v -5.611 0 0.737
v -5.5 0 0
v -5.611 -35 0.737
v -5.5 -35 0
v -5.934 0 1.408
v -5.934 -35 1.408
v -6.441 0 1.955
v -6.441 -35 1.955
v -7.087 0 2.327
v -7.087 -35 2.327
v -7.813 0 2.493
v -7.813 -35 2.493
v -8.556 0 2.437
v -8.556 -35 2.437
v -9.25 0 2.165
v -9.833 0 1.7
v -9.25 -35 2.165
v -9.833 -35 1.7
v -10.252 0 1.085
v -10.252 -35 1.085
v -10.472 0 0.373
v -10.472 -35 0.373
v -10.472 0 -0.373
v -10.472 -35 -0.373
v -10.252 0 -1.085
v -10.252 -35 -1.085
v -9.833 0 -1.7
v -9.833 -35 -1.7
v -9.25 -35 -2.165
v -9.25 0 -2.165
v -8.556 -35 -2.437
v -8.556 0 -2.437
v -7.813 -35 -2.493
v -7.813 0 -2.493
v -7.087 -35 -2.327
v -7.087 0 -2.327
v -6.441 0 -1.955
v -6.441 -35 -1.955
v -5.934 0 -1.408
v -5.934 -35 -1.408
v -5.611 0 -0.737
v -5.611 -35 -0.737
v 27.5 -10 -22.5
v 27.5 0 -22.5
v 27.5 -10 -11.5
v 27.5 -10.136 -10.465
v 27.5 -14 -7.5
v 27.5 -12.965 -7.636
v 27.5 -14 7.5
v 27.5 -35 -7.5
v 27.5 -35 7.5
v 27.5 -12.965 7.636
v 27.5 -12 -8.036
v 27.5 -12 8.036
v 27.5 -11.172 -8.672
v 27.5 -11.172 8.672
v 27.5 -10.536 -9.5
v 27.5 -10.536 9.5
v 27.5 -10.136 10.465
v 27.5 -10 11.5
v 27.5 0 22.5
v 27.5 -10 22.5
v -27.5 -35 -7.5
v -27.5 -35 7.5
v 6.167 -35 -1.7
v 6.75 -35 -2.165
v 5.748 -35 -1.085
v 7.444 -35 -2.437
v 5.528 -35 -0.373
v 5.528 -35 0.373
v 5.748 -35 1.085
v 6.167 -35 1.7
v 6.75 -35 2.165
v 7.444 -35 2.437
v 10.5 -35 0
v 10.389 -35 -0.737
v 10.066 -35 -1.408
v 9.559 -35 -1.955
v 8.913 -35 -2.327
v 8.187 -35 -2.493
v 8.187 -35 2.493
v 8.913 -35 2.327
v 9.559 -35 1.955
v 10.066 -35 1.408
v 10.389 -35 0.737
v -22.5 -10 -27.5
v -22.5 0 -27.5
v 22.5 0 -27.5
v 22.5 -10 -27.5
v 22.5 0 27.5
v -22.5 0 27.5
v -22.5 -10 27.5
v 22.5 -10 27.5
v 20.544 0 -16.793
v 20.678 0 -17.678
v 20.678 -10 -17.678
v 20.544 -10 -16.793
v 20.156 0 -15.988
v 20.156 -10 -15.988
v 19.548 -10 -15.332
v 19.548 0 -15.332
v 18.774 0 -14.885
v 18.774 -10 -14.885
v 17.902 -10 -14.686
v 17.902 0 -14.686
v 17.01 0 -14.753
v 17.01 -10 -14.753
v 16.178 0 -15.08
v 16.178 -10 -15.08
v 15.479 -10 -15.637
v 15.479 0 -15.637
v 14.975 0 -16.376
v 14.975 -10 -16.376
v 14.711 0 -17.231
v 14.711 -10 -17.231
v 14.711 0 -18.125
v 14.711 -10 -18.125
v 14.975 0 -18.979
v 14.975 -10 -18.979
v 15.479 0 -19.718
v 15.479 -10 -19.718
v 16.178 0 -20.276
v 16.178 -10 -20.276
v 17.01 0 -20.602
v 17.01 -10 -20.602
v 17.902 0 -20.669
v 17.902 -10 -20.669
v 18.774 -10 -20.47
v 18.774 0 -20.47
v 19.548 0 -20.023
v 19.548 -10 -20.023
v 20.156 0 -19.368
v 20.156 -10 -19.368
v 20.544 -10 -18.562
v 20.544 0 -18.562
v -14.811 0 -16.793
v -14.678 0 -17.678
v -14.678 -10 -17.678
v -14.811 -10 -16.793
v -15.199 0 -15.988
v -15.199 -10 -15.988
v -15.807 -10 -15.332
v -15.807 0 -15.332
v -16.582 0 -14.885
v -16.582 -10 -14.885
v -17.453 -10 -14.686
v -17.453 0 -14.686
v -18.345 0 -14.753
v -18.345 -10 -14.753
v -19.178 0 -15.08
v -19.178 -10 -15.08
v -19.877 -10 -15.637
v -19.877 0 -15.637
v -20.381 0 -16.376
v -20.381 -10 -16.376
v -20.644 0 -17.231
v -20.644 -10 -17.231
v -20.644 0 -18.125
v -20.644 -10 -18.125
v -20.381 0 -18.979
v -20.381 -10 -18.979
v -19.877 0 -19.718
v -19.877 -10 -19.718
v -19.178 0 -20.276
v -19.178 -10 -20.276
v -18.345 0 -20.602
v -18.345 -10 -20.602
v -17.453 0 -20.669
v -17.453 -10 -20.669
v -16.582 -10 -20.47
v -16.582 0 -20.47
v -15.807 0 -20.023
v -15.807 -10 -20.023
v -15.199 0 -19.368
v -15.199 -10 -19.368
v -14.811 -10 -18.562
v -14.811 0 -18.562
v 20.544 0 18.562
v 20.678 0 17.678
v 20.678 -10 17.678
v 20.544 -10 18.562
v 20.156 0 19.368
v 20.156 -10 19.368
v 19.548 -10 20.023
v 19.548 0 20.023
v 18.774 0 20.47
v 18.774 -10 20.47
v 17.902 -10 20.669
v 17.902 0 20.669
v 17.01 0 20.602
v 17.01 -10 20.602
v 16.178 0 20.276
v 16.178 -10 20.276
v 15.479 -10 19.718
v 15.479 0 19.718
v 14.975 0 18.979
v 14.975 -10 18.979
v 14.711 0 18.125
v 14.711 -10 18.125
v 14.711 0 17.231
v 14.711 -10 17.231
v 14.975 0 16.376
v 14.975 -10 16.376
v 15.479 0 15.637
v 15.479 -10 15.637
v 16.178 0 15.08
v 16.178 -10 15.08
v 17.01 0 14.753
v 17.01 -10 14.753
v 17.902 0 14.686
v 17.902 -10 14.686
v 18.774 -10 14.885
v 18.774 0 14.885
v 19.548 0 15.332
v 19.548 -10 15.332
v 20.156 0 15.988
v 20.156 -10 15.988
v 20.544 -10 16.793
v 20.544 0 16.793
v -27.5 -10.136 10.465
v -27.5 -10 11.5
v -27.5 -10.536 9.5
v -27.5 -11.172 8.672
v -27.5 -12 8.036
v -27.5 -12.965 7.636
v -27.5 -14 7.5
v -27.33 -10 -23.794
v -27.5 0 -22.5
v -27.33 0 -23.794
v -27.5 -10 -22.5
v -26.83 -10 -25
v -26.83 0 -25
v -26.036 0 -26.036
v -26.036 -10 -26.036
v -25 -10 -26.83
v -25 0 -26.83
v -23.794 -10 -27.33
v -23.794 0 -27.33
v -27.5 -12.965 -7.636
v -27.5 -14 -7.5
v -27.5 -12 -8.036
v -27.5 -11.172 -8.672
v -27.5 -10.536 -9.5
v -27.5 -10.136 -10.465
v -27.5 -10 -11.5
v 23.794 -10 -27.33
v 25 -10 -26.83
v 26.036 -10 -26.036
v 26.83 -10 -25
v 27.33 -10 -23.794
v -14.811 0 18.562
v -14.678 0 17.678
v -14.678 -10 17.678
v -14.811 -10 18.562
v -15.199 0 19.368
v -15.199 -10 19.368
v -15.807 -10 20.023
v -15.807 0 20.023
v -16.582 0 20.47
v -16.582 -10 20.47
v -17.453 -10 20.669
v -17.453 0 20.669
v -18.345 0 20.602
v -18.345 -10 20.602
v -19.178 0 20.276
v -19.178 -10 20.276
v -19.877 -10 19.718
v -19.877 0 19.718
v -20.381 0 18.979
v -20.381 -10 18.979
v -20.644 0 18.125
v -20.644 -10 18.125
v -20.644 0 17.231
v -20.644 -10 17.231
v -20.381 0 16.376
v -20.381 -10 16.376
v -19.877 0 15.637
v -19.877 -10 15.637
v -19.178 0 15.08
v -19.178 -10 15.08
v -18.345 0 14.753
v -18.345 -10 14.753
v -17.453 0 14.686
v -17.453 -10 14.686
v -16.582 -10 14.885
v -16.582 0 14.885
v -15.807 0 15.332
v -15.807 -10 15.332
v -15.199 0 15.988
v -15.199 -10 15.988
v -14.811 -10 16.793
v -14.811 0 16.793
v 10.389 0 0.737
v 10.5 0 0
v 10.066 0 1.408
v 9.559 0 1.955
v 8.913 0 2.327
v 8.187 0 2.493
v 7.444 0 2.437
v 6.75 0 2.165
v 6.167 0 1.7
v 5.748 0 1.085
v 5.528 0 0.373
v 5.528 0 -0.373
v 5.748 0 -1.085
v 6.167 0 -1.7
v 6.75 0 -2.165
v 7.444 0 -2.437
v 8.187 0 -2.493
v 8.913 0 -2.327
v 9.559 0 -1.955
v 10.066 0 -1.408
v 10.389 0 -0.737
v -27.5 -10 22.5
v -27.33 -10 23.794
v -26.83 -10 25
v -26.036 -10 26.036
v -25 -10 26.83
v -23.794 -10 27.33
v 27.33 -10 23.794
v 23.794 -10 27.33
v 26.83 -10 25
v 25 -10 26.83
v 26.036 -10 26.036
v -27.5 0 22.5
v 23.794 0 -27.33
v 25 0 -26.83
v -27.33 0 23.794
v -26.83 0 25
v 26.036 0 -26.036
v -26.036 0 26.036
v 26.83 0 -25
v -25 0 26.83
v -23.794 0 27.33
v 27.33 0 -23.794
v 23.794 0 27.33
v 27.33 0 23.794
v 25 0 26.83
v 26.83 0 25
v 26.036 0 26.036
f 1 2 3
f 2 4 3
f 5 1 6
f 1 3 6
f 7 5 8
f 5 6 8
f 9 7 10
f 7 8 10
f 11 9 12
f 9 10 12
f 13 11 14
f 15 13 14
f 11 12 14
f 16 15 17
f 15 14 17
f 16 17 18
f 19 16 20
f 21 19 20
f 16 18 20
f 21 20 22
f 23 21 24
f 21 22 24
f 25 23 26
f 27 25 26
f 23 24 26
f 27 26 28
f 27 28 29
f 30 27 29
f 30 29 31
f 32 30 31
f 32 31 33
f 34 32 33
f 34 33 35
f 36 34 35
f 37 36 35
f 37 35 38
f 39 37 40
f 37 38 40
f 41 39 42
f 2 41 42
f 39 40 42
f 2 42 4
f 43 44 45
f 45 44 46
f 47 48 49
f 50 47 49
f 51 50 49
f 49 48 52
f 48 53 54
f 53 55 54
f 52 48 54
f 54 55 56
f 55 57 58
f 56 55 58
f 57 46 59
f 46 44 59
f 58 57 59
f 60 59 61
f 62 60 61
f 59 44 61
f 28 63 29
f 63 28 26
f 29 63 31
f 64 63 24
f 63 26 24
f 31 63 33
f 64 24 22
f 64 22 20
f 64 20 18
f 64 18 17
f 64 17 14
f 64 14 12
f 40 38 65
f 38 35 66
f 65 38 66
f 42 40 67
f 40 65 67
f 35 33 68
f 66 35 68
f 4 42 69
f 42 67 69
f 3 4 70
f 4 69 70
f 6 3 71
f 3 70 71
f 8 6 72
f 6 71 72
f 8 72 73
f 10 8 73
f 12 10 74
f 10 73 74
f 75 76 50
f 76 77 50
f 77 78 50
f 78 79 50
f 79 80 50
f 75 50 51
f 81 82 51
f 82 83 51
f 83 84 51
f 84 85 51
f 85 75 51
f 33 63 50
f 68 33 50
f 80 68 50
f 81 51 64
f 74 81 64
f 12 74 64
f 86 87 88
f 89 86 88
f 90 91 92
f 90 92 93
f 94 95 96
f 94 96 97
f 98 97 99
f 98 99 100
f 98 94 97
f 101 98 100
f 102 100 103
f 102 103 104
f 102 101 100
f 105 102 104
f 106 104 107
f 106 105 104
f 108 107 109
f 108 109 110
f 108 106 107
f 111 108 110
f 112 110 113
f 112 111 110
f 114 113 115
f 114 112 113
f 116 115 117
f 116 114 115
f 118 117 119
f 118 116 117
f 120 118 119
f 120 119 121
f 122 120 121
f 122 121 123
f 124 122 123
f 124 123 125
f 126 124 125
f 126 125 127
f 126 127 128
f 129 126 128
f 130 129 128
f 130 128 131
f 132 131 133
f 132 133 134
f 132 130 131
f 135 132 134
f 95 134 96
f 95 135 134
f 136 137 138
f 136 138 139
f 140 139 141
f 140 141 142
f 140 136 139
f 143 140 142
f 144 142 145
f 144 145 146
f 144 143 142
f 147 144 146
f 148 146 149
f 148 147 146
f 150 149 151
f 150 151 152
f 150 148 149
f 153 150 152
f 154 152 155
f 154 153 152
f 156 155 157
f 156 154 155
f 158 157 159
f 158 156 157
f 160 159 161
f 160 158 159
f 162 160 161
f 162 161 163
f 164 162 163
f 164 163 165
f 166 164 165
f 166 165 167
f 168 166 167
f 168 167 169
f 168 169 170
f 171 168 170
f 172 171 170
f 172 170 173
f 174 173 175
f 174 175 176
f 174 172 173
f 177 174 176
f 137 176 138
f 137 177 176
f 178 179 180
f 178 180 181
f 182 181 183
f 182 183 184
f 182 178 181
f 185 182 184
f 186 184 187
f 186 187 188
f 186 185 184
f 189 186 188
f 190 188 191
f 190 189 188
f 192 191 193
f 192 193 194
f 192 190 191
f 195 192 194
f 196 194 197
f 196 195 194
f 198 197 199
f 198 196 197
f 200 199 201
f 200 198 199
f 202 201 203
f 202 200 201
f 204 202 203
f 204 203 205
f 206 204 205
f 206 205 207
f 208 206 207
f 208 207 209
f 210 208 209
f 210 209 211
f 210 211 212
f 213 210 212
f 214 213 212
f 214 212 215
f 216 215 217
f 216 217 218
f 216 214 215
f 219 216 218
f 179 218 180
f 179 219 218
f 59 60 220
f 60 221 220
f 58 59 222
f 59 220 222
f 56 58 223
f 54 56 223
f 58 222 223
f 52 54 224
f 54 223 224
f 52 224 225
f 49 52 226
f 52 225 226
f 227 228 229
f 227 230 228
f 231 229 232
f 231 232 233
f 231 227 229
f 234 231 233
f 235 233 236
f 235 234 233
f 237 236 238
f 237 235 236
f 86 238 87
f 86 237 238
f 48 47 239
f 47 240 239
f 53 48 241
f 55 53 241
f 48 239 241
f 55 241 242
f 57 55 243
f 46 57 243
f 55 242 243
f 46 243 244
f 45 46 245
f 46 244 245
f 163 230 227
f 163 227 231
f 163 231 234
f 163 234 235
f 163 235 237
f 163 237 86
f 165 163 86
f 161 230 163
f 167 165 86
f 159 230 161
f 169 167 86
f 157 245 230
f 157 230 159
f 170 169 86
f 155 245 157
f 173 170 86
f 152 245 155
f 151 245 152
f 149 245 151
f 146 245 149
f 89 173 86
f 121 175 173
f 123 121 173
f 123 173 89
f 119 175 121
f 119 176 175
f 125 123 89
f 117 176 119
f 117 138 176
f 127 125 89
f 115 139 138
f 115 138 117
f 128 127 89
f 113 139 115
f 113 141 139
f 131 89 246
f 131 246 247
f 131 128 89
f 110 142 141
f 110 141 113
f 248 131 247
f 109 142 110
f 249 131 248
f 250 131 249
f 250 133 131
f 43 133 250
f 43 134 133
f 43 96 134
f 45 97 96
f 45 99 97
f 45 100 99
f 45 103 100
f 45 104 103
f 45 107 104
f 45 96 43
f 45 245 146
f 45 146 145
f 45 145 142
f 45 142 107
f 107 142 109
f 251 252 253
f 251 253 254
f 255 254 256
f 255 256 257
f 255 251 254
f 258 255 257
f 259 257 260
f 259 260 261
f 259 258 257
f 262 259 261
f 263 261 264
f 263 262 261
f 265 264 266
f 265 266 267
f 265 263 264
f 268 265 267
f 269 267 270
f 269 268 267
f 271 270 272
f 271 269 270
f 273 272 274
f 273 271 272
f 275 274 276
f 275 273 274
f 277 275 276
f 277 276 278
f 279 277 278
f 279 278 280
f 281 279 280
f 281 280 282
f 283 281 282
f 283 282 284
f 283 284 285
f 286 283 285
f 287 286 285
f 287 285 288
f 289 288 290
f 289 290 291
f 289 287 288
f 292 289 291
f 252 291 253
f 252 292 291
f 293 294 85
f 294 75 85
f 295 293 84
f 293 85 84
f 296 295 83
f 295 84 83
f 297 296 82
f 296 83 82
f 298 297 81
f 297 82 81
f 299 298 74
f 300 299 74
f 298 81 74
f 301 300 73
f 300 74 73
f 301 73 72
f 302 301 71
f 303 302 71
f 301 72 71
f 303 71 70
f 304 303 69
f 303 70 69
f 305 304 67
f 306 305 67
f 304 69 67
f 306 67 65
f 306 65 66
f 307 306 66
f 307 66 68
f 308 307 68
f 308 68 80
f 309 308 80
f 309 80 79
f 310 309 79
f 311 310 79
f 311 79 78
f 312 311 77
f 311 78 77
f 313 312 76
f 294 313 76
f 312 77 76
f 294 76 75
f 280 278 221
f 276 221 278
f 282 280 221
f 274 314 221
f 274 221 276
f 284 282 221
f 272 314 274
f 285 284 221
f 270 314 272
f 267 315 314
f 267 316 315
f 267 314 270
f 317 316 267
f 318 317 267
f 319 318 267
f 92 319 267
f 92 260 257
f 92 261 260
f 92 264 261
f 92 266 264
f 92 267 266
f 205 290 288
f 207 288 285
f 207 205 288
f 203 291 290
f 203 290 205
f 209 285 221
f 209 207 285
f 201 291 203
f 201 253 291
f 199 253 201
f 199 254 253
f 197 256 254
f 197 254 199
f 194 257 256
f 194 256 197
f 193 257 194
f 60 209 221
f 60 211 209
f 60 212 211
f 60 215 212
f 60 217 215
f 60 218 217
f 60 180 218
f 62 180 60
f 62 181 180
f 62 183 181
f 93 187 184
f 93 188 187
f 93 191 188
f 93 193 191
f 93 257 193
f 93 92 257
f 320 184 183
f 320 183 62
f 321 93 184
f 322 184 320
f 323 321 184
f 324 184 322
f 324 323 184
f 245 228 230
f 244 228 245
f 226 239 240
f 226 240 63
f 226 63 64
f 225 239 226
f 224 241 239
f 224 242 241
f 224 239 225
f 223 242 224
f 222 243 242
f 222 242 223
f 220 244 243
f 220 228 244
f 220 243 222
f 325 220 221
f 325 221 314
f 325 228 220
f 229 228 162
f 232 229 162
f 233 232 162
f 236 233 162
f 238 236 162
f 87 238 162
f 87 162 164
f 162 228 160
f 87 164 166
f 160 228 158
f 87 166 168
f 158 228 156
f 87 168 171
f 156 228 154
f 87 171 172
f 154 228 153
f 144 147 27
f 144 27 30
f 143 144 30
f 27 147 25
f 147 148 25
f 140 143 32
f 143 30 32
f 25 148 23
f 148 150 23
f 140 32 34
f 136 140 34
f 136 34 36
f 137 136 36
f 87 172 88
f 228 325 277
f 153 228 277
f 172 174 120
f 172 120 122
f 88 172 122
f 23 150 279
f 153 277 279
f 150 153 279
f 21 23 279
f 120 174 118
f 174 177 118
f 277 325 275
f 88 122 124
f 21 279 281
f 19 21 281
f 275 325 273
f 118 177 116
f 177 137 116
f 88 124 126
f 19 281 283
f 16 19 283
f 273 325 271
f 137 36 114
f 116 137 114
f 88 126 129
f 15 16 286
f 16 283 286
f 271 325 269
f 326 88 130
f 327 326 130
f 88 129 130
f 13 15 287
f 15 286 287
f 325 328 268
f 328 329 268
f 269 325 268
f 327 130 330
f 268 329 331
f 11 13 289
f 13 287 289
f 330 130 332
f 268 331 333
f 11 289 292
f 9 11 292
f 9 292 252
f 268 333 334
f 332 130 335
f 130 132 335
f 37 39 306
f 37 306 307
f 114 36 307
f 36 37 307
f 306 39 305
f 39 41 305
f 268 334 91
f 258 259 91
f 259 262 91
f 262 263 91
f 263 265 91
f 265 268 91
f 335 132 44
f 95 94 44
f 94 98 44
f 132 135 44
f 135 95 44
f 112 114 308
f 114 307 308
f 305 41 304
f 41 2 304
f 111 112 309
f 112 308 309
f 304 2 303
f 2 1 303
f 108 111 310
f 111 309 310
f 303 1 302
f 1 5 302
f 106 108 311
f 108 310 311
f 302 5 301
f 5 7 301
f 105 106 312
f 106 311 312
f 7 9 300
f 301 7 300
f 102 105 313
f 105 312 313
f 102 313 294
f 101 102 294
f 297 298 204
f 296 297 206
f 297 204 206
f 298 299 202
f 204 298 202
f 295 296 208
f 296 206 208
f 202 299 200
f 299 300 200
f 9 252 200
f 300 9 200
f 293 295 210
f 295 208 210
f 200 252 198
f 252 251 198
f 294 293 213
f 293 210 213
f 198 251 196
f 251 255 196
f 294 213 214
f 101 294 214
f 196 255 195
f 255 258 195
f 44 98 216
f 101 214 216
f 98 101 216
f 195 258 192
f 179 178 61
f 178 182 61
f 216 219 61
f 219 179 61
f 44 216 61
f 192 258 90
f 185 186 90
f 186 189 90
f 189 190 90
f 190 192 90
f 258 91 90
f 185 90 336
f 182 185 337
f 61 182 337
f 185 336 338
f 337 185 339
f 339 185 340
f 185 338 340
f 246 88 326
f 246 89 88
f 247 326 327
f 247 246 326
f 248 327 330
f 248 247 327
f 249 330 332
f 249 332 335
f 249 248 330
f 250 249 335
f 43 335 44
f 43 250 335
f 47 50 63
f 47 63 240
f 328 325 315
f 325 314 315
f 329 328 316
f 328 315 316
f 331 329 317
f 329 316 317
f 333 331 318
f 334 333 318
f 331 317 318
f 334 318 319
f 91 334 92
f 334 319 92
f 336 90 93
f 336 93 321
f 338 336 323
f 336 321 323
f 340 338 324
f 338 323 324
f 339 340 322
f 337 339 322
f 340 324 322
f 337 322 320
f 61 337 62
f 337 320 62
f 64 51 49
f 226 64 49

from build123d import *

# Parameters (mm, degrees)
F0_W          = 55
F0_H          = 55
F0_R          = 3
F1_DEPTH      = 10
F2_R          = 5
F3_W          = 25
F3_H          = 15
F4_DEPTH      = 55
F5_R          = 2.5
F6_DEPTH      = 10.001
F6_DEPTH_BACK = 25.001
F7_R          = 4


with BuildPart() as f1:
    # F0 (on Front) → F1 (new body)
    with BuildSketch(Plane.XZ):
        Rectangle(F0_W, F0_H)
        with Locations((-17.6776695297, -17.6776695297)):
            Circle(F0_R, mode=Mode.SUBTRACT)
        with Locations((17.6776695297, -17.6776695297)):
            Circle(F0_R, mode=Mode.SUBTRACT)
        with Locations((-17.6776695297, 17.6776695297)):
            Circle(F0_R, mode=Mode.SUBTRACT)
        with Locations((17.6776695297, 17.6776695297)):
            Circle(F0_R, mode=Mode.SUBTRACT)
    extrude(amount=F1_DEPTH)

    # F2
    f2_edges = [f1.edges().sort_by_distance(p)[0] for p in [
        (-27.5, -5, 27.5),
        (-27.5, -5, -27.5),
        (27.5, -5, 27.5),
        (27.5, -5, -27.5),
    ]]
    fillet(f2_edges, radius=F2_R)

    # F3 (on face) → F4 (join)
    with BuildSketch(Plane.YZ.offset(27.5)):
        with Locations((-22.5, 0)):
            Rectangle(F3_W, F3_H)
    extrude(amount=-F4_DEPTH)

    # F5 (on face) → F6 (cut, two sides)
    with BuildSketch(Plane.XZ.offset(10)) as f6_sk:
        with Locations((8, 0)):
            Circle(F5_R)
        with Locations((-8, 0)):
            Circle(F5_R)
    extrude(amount=-F6_DEPTH, mode=Mode.SUBTRACT)
    extrude(f6_sk.sketch, amount=F6_DEPTH_BACK, mode=Mode.SUBTRACT)

    # F7
    f7_edges = [f1.edges().sort_by_distance(p)[0] for p in [
        (0, -10, -7.5),
        (0, -10, 7.5),
    ]]
    fillet(f7_edges, radius=F7_R)


solid = f1.part
